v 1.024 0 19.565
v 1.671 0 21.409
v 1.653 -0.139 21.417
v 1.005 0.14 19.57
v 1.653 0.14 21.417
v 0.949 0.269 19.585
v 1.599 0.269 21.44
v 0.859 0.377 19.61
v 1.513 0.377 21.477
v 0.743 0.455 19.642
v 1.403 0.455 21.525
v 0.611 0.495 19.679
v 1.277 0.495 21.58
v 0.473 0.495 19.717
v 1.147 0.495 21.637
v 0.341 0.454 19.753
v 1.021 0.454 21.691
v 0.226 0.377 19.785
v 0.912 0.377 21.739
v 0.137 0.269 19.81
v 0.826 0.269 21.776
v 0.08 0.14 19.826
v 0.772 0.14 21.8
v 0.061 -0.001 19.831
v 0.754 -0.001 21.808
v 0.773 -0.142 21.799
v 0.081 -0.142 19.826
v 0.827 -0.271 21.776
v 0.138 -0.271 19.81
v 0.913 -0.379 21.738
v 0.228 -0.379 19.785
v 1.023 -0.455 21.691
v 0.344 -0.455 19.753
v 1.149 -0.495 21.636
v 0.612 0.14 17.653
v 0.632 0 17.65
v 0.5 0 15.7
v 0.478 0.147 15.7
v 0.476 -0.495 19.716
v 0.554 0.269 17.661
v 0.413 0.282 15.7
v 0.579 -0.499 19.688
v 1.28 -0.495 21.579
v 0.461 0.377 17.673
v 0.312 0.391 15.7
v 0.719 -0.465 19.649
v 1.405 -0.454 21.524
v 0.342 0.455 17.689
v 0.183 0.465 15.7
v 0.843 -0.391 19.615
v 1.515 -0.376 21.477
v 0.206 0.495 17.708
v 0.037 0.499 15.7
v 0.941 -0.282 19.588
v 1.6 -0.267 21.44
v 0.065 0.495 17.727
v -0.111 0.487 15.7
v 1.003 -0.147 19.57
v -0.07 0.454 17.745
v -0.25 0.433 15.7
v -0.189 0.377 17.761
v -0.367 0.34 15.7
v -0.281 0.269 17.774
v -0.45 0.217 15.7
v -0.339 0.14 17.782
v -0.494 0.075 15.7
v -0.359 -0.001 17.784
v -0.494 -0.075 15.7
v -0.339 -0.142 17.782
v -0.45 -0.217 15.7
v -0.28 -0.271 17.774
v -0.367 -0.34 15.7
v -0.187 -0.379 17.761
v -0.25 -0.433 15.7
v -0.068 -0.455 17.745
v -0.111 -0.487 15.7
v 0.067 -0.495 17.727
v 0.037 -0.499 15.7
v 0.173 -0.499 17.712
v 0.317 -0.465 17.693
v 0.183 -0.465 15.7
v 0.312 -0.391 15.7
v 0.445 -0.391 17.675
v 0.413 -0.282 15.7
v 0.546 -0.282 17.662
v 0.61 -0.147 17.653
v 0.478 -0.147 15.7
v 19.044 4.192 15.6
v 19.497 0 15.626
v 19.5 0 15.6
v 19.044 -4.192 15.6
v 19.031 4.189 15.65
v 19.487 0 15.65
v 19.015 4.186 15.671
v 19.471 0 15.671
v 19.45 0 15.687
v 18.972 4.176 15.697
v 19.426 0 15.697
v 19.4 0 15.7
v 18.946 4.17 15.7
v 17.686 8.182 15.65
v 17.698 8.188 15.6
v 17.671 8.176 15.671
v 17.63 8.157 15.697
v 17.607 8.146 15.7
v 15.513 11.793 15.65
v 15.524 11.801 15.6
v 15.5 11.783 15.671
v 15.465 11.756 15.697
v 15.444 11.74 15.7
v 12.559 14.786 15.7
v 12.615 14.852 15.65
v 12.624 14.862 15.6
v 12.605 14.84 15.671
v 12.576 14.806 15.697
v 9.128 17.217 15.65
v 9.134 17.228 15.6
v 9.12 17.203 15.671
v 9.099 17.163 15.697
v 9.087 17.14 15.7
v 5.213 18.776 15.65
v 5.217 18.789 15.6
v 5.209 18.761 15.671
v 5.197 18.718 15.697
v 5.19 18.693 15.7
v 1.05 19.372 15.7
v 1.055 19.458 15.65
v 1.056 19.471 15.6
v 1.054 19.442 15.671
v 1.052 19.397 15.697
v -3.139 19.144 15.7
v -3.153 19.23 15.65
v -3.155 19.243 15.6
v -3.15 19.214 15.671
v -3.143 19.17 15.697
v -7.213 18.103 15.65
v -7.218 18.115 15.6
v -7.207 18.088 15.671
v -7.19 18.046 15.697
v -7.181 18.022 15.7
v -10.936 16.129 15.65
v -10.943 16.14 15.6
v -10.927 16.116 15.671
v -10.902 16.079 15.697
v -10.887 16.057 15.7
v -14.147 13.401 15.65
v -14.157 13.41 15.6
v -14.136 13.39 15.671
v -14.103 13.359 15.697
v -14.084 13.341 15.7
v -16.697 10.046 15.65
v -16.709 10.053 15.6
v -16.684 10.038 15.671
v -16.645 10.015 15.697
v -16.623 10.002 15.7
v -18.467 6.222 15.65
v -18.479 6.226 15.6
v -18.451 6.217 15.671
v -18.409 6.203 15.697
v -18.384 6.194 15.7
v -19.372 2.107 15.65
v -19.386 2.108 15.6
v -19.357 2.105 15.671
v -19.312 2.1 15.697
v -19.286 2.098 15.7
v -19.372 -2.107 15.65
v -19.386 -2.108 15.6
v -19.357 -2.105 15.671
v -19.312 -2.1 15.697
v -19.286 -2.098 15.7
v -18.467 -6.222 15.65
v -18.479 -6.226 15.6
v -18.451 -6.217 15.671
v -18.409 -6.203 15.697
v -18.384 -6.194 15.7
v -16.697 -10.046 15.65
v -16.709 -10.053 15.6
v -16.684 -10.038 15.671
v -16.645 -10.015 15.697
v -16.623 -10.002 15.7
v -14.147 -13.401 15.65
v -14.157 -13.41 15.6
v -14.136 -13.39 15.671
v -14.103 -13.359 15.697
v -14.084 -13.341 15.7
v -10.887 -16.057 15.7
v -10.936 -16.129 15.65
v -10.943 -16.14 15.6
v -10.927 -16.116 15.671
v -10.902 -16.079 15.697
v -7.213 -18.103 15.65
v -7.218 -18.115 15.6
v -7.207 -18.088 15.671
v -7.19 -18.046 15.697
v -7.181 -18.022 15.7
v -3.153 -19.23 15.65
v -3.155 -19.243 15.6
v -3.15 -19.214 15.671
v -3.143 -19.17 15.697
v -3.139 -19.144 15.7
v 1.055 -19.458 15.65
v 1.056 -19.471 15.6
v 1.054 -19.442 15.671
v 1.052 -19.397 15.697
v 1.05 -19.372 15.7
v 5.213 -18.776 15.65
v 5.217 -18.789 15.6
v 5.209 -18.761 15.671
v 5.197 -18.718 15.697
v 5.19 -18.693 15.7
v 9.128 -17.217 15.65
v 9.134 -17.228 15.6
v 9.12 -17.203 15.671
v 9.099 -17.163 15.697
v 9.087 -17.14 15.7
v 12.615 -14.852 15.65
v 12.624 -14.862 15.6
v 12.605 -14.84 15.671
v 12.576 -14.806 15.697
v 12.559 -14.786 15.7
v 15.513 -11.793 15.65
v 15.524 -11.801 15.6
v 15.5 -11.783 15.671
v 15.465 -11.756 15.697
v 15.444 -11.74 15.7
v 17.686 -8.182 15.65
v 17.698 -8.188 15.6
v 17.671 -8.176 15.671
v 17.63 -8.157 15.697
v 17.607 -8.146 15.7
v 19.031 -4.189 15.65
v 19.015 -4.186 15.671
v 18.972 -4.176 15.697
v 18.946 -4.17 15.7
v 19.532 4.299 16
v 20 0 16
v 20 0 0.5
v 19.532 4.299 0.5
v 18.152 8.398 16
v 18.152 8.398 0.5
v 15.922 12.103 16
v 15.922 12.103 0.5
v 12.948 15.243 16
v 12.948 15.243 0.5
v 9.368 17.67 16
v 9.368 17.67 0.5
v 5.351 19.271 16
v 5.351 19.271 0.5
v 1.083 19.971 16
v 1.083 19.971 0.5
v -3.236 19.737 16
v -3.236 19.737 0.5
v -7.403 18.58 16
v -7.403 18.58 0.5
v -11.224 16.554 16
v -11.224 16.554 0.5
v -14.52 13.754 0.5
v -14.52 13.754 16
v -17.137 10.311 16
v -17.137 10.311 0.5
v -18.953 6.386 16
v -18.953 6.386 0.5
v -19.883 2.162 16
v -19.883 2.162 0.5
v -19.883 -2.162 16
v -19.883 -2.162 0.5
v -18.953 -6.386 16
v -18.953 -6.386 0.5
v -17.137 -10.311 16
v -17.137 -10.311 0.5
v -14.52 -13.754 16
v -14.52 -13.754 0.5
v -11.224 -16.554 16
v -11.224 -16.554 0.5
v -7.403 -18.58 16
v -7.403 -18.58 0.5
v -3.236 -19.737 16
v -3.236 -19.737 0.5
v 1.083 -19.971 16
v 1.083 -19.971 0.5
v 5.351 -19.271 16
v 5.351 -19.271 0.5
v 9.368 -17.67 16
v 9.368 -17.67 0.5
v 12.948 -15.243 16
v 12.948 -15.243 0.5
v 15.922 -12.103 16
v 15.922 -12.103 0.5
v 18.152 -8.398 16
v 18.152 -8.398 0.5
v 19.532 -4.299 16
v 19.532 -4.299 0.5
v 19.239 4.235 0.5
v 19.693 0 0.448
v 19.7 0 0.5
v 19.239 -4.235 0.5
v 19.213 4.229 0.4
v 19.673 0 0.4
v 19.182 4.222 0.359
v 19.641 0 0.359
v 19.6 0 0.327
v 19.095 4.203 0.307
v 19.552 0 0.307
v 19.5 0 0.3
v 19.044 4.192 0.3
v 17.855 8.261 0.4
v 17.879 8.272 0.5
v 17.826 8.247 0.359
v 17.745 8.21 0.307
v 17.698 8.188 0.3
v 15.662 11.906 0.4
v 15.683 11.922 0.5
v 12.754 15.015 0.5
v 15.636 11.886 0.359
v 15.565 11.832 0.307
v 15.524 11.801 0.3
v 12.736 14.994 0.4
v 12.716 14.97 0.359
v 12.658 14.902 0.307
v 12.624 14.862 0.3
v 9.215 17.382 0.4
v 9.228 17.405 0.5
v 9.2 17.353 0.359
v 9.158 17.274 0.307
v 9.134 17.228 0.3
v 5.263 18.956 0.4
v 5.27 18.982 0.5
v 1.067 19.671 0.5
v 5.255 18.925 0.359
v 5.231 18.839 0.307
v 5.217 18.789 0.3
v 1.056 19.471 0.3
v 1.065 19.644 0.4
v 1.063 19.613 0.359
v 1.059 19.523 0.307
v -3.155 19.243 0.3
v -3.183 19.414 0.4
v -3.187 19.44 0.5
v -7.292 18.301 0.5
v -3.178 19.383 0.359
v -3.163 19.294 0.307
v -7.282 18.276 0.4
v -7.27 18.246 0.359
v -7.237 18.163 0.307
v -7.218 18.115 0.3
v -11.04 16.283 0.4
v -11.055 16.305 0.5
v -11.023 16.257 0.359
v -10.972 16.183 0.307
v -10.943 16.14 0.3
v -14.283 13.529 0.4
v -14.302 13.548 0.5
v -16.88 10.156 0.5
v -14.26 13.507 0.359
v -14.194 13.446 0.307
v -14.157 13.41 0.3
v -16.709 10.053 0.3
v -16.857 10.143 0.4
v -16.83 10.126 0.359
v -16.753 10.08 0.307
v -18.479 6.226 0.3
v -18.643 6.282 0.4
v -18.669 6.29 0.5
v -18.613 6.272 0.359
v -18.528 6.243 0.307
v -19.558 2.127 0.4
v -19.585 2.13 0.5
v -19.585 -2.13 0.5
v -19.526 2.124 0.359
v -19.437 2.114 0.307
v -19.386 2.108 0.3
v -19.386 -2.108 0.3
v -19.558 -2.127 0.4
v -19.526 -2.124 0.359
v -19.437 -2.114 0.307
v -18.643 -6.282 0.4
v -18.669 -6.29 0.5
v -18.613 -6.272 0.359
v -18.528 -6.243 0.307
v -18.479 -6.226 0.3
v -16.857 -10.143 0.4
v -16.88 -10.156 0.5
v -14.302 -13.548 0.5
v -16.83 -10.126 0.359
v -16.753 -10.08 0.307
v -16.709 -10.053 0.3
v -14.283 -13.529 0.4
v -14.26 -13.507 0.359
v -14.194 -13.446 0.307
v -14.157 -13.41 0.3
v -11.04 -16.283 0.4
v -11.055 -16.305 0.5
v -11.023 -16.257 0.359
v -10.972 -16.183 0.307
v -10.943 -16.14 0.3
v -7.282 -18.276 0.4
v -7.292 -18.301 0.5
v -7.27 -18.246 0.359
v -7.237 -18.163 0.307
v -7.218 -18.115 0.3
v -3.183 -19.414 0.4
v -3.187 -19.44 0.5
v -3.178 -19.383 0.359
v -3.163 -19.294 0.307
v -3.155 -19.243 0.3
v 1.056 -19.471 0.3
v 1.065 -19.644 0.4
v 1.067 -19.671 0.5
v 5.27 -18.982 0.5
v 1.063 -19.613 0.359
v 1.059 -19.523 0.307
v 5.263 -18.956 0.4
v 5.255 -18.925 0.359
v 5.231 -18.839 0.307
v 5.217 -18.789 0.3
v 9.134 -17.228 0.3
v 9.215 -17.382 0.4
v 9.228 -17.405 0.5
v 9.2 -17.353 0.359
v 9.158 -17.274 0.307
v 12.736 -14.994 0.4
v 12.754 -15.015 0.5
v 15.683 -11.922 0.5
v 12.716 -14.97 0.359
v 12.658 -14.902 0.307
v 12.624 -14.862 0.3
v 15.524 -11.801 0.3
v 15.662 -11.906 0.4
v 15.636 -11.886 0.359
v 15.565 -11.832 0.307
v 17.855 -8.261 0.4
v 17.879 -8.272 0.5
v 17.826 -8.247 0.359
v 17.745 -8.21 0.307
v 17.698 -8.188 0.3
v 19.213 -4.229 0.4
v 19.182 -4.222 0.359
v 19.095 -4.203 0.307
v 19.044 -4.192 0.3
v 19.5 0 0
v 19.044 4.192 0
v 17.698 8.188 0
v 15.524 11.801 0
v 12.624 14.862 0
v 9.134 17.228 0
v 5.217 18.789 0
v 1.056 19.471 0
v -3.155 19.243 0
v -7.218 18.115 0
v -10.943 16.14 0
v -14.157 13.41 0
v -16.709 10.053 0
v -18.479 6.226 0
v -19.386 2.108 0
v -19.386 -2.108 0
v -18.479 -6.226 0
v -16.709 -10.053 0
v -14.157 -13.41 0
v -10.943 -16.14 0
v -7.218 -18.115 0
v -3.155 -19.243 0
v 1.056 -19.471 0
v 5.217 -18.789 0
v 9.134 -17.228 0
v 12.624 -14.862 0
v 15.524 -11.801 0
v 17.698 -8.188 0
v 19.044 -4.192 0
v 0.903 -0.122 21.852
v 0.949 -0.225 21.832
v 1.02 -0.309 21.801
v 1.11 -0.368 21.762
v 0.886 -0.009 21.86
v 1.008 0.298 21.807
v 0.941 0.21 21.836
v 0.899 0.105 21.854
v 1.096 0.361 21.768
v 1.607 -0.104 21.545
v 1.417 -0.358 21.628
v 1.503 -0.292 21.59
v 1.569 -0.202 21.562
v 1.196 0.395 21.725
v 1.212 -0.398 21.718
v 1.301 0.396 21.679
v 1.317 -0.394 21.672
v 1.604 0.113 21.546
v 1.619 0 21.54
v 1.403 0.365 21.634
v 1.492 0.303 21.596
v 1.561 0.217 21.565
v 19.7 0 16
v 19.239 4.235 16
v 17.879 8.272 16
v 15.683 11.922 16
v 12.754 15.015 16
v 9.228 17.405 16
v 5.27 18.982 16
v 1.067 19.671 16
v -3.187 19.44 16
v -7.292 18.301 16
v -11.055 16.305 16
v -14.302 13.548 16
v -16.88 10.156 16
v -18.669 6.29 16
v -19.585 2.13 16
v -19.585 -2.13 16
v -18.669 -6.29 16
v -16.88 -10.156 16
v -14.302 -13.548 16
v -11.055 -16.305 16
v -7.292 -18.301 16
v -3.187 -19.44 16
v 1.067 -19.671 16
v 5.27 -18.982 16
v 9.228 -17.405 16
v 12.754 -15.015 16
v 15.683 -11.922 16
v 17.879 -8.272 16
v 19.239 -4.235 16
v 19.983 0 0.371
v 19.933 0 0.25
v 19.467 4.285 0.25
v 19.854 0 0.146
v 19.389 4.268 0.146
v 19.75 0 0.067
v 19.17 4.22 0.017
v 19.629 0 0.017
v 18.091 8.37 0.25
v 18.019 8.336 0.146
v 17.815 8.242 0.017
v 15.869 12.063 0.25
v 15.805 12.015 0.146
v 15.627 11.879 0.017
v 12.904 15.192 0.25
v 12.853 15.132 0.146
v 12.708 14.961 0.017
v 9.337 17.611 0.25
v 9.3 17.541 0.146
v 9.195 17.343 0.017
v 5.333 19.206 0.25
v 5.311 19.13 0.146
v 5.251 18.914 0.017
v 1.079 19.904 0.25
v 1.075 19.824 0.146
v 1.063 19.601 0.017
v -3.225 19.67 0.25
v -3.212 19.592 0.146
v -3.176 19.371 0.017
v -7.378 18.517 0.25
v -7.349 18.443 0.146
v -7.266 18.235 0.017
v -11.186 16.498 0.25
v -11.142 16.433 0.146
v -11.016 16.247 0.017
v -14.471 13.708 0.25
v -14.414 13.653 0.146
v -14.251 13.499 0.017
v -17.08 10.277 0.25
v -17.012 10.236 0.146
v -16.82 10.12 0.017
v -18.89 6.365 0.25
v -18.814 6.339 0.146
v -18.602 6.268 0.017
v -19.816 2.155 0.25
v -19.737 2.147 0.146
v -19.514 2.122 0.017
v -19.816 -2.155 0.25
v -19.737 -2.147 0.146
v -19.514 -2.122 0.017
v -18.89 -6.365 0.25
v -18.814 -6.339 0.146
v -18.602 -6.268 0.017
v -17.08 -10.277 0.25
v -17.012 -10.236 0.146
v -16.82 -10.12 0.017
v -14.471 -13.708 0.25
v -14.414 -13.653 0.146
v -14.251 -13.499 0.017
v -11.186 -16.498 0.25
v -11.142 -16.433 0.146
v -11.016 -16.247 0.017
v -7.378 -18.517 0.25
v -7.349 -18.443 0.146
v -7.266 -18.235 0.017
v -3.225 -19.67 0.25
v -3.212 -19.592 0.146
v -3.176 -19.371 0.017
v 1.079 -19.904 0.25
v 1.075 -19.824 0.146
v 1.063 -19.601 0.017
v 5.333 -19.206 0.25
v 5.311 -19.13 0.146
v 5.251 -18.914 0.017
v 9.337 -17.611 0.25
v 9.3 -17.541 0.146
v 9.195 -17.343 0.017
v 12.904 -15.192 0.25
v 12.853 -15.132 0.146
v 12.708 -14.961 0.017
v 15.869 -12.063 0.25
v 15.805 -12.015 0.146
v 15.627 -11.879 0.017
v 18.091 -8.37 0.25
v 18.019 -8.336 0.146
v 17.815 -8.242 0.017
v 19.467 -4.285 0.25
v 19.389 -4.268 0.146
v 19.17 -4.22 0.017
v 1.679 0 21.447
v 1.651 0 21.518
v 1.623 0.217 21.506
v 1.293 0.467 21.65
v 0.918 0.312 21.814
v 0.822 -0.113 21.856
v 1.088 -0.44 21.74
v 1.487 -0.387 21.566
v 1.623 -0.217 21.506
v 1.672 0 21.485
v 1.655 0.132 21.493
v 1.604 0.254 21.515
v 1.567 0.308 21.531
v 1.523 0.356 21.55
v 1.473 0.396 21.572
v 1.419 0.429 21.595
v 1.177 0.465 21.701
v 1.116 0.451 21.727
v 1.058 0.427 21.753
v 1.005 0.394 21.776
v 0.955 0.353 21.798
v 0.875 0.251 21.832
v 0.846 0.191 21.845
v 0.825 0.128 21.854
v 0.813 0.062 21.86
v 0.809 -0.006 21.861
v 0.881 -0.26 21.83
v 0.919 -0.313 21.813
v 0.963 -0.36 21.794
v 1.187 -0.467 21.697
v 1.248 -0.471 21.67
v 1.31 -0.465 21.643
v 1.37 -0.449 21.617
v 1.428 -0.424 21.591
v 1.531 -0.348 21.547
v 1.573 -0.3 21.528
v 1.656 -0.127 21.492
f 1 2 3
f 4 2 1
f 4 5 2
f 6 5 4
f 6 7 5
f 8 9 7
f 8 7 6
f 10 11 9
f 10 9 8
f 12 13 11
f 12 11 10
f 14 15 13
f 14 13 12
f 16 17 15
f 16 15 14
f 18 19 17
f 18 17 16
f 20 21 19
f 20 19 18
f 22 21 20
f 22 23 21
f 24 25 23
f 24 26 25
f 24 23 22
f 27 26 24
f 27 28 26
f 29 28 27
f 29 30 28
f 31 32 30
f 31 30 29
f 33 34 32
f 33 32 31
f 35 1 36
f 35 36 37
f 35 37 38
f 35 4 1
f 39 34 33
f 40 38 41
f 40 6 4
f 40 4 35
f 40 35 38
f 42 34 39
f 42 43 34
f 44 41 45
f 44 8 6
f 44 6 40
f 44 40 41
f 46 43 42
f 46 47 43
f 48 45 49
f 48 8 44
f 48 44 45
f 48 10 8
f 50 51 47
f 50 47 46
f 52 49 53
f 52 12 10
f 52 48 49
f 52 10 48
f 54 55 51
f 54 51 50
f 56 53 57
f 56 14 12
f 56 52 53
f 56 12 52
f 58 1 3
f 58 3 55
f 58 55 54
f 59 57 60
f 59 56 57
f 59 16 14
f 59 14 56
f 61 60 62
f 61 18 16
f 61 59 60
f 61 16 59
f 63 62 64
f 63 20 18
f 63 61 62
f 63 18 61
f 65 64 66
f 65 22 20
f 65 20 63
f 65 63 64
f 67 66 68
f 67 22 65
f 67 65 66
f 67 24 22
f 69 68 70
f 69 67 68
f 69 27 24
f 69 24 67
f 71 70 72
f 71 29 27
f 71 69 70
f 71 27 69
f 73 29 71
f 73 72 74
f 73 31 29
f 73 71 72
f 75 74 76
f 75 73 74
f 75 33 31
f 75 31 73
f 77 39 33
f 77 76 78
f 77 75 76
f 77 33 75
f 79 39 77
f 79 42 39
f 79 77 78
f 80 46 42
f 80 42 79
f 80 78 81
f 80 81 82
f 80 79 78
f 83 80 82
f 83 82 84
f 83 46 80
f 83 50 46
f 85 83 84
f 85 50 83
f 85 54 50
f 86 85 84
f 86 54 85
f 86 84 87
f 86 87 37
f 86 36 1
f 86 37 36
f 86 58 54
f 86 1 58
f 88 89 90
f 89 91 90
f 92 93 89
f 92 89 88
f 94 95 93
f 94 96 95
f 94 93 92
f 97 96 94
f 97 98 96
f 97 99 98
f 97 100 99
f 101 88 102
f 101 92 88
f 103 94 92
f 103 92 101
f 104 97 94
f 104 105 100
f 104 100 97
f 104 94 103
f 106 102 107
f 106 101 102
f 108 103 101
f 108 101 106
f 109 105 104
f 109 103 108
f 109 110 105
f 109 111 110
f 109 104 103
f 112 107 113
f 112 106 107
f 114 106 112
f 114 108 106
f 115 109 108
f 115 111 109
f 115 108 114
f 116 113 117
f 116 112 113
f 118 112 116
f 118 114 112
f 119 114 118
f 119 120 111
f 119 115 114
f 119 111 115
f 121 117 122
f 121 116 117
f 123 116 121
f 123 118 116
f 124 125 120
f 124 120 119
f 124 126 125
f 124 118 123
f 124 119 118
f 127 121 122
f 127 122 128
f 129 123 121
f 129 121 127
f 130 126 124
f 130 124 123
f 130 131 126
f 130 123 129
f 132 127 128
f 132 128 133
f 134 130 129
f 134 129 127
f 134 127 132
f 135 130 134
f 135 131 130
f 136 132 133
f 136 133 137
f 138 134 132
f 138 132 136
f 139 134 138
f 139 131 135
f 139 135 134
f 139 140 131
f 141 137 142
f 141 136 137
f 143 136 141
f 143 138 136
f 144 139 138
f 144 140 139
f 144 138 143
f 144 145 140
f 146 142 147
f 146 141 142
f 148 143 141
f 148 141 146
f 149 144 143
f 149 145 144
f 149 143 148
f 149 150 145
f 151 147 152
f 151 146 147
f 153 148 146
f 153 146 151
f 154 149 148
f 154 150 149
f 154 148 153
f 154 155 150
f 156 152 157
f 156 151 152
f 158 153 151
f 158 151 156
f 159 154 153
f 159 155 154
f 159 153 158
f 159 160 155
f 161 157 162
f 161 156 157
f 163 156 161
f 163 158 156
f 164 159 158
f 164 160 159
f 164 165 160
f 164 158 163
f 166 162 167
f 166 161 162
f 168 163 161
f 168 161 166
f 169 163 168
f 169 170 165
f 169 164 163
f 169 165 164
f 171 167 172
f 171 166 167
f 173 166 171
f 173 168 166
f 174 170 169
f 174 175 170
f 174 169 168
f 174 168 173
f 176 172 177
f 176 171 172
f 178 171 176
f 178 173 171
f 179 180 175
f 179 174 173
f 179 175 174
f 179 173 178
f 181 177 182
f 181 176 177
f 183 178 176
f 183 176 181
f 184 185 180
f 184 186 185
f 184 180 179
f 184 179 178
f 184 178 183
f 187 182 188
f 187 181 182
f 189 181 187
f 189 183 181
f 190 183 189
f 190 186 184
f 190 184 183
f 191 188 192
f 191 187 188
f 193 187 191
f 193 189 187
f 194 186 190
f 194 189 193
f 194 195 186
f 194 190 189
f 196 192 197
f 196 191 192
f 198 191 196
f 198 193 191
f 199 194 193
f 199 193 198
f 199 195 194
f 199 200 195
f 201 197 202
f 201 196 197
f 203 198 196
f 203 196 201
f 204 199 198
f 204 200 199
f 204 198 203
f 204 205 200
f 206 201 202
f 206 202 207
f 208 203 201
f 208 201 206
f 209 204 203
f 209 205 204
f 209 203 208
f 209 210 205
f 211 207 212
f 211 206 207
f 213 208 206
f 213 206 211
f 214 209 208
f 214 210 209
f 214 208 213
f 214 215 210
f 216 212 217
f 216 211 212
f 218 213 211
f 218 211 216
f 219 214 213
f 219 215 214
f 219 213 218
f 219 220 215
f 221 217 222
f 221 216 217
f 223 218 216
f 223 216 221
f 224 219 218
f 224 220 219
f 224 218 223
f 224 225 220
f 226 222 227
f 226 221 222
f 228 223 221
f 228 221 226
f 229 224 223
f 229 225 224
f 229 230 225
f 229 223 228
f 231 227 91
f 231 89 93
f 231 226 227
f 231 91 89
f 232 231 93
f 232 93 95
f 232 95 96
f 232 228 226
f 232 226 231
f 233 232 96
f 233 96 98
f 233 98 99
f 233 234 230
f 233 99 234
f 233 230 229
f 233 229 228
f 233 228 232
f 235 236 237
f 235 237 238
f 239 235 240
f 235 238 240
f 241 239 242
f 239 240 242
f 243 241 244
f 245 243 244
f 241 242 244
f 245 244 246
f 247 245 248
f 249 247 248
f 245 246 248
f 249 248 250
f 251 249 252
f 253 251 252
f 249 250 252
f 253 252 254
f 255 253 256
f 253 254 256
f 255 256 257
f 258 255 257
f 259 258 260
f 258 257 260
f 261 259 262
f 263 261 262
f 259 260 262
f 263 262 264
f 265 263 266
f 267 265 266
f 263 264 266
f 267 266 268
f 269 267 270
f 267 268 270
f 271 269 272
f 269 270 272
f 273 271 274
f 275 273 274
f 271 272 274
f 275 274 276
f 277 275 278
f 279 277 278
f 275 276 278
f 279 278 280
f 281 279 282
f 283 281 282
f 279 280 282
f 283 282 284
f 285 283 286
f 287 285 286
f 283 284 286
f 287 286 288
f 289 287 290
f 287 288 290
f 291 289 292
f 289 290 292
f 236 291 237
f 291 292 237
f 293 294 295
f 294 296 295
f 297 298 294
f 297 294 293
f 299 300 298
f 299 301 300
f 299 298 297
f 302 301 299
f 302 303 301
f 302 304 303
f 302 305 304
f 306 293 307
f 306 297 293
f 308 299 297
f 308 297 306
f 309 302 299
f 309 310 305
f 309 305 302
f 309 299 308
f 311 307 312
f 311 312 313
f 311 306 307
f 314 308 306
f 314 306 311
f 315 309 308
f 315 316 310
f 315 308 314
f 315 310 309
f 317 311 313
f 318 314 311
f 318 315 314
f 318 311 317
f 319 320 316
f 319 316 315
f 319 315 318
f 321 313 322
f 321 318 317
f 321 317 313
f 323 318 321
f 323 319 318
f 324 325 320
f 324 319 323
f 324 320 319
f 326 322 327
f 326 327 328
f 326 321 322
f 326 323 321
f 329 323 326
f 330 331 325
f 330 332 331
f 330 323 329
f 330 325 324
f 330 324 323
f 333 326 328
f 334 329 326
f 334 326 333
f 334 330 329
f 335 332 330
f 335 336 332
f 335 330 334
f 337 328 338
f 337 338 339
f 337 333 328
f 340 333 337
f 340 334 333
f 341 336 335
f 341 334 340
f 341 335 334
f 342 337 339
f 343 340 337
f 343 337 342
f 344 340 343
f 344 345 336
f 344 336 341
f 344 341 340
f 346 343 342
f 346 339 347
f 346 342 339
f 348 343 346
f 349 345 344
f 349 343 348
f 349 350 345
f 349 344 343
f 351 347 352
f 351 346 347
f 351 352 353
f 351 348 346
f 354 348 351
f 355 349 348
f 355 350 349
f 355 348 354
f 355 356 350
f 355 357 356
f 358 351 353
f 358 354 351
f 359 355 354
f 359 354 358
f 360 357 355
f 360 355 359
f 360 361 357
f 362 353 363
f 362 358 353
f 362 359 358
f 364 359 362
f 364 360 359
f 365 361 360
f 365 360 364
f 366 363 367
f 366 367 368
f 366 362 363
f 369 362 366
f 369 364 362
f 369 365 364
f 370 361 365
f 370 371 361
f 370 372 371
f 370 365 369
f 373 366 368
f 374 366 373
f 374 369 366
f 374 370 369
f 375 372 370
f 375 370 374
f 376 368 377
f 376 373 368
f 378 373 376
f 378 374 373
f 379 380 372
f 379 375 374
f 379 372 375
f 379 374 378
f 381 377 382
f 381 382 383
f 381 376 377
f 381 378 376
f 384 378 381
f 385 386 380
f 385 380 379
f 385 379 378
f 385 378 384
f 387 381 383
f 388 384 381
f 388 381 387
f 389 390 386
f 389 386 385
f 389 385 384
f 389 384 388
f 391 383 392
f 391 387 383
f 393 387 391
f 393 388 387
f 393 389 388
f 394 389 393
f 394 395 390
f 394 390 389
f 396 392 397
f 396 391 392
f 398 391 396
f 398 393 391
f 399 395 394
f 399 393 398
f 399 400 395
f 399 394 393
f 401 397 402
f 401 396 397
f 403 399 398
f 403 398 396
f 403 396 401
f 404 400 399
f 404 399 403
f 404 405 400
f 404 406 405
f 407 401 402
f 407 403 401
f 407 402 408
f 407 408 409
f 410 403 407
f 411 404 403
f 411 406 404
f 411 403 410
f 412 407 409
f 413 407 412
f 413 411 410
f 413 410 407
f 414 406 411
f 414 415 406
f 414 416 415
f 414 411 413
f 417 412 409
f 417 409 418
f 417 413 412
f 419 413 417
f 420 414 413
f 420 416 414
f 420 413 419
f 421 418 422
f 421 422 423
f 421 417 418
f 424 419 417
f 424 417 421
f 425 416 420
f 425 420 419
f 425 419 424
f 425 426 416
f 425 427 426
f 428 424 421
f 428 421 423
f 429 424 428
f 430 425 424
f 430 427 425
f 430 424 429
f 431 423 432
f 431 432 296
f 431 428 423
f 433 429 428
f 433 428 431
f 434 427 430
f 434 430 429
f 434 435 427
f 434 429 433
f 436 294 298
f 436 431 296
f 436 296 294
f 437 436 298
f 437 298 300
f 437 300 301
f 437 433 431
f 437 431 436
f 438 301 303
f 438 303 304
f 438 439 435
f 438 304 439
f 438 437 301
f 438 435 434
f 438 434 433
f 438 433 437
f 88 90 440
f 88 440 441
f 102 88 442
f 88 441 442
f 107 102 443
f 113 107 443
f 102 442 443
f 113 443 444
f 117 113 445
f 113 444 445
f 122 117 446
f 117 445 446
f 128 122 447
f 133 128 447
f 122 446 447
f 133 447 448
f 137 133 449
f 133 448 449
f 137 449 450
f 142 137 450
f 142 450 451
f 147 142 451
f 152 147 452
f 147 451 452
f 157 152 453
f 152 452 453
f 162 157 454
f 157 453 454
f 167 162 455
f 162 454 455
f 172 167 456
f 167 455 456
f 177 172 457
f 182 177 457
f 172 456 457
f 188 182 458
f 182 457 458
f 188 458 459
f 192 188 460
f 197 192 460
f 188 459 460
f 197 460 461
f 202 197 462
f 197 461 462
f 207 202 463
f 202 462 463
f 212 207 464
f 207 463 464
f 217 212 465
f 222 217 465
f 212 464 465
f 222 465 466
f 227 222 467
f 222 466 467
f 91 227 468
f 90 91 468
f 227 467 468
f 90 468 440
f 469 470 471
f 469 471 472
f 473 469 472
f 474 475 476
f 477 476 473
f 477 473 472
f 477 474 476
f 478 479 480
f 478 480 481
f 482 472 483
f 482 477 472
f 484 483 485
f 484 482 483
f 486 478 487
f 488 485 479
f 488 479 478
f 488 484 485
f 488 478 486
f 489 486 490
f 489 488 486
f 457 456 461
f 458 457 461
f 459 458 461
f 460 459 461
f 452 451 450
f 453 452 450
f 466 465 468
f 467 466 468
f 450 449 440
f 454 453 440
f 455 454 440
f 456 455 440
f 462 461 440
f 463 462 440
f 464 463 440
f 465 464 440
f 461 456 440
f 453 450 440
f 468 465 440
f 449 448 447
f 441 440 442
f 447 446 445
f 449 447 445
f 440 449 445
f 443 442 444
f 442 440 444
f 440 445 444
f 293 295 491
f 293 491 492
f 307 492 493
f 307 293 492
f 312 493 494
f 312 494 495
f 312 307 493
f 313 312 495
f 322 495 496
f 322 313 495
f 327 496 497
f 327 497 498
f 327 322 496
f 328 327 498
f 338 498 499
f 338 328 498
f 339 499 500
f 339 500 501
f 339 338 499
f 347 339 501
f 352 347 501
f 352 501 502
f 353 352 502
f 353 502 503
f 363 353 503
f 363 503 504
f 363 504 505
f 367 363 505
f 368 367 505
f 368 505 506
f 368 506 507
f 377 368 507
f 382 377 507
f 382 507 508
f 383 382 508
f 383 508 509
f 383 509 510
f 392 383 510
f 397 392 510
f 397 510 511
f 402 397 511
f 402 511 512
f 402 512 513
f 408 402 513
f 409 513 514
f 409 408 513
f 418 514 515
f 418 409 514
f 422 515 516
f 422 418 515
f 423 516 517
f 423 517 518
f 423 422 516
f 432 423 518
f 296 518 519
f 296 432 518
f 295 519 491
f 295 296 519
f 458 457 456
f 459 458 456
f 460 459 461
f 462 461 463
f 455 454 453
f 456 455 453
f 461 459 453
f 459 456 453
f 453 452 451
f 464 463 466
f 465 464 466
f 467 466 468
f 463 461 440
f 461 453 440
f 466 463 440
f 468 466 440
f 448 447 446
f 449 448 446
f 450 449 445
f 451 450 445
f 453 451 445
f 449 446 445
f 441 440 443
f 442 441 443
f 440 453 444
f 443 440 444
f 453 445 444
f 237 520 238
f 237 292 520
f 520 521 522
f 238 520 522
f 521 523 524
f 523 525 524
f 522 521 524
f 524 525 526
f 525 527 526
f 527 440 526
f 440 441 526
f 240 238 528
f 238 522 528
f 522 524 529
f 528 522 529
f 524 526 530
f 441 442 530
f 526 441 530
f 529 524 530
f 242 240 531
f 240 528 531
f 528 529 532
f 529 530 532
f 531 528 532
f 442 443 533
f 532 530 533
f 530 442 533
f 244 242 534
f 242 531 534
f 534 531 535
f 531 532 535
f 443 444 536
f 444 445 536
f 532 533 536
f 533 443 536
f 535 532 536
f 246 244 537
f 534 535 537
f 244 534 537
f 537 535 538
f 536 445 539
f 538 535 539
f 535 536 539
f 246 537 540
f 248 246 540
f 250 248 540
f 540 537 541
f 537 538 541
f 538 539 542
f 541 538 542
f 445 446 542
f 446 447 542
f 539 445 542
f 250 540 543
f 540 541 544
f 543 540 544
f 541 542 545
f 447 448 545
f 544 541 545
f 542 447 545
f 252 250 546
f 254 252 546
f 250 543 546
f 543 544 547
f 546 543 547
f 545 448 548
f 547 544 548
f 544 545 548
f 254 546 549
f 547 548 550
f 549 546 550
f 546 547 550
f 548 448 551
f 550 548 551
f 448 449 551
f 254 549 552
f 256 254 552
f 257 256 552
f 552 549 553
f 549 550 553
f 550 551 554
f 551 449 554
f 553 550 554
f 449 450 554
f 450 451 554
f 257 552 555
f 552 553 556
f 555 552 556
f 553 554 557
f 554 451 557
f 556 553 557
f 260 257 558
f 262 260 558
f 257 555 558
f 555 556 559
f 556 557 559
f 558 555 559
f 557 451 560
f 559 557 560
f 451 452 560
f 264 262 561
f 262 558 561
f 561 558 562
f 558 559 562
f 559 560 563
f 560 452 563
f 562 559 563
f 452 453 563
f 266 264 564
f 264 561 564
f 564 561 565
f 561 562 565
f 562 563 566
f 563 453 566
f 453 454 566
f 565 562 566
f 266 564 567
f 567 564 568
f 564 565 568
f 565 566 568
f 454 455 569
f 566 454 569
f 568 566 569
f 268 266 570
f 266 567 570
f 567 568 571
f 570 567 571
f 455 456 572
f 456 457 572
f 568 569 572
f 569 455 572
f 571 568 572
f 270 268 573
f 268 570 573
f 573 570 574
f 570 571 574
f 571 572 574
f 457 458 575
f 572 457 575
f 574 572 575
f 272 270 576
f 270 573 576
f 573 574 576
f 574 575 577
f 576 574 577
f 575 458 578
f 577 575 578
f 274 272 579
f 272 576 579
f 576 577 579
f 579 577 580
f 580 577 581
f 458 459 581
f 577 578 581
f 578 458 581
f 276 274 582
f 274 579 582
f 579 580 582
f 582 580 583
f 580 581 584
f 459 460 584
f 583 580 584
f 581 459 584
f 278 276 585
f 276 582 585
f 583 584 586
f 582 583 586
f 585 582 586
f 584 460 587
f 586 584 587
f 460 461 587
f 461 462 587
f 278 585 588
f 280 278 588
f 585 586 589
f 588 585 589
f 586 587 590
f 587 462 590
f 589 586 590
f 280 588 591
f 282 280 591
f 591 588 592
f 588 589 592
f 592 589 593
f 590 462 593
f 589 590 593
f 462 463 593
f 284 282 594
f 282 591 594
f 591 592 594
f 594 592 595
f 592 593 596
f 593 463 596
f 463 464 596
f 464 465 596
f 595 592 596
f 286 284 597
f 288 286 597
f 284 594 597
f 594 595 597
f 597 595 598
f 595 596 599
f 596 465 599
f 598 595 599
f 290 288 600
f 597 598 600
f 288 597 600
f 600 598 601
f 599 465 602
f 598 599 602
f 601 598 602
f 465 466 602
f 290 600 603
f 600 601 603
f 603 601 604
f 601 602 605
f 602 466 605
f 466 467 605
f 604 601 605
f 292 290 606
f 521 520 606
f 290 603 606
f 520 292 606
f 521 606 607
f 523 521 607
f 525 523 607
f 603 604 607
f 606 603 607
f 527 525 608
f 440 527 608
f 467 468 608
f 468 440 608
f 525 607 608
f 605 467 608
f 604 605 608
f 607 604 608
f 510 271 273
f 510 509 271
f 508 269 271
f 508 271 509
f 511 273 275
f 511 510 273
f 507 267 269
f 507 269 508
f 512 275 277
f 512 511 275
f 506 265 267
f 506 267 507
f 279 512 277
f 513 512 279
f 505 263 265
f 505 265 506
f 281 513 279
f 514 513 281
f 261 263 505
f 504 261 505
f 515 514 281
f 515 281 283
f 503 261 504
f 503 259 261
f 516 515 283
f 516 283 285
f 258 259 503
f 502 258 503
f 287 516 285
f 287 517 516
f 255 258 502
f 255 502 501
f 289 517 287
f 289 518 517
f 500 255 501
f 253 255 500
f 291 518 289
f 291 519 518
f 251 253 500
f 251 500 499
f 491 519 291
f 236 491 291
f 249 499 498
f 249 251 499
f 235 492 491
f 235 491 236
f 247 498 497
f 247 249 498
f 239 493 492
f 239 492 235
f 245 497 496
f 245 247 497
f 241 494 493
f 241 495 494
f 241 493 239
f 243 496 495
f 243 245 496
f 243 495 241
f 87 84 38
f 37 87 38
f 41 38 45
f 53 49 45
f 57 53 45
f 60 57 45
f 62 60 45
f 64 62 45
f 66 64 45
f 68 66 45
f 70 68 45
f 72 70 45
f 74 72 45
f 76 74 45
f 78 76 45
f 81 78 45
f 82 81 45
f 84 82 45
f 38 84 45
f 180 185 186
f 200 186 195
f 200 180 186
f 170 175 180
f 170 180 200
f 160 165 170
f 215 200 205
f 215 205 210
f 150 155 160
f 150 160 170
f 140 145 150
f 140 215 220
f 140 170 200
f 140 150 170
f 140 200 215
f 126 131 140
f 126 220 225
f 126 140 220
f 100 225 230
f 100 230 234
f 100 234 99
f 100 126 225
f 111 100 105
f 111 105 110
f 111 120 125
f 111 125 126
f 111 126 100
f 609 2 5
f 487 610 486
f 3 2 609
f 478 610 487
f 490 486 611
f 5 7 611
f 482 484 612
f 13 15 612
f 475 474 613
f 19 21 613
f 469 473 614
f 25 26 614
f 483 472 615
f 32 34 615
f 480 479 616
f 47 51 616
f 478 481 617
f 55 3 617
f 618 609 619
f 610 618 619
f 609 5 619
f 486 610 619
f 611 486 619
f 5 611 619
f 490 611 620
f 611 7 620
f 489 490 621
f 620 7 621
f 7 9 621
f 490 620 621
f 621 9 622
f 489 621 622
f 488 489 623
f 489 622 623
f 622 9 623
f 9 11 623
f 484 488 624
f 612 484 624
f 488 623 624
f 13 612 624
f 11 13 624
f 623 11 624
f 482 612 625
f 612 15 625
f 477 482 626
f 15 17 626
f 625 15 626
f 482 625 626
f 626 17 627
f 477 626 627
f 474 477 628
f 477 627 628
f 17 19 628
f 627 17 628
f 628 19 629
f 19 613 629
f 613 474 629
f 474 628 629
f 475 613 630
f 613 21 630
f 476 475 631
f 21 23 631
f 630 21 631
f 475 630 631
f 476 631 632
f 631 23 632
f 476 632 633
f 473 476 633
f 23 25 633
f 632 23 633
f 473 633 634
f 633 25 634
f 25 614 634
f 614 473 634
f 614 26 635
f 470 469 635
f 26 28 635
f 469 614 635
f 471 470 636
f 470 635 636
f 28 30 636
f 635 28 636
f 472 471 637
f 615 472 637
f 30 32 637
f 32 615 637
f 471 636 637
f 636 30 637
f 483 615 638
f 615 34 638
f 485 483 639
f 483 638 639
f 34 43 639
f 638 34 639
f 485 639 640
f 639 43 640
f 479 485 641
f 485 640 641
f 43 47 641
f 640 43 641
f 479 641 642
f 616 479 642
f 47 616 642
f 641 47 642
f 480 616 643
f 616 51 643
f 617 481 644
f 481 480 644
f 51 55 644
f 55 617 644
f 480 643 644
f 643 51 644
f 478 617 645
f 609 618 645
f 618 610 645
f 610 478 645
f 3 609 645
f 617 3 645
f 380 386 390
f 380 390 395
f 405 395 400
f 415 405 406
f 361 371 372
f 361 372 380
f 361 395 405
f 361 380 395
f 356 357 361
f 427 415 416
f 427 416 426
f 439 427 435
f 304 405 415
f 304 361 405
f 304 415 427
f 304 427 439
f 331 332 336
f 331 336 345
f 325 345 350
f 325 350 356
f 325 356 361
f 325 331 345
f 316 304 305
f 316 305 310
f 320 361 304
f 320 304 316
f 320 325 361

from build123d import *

# Parameters (mm, degrees)
F0_R     = 20
F1_DEPTH = 16
F2_R     = 0.5
F3_T     = -0.3
F4_R     = 19.5
F5_DEPTH = 15.7
F7_R     = 0.5
F9_R     = 0.1
F10_R    = 0.1


with BuildPart() as f1:
    # F0 (on Top) → F1 (new body)
    with BuildSketch(Plane.XY):
        Circle(F0_R)
    extrude(amount=F1_DEPTH)

    # F2
    f2_edges = [f1.edges().sort_by_distance(p)[0] for p in [
        (-20, 0, 0),
    ]]
    fillet(f2_edges, radius=F2_R)

    # F3
    f3_openings = [f1.faces().sort_by_distance(p)[0] for p in [
        (0, 0, 16),
    ]]
    offset(amount=F3_T, openings=f3_openings)


with BuildPart() as f5:
    # F4 (on Top) → F5 (new body)
    with BuildSketch(Plane.XY):
        Circle(F4_R)
    extrude(amount=F5_DEPTH)

    # F10
    f10_edges = [f5.edges().sort_by_distance(p)[0] for p in [
        (-19.5, 0, 15.7),
    ]]
    fillet(f10_edges, radius=F10_R)


with BuildPart() as f8:
    # F8: sweep along a path in F6
    with BuildLine(Plane.XZ) as f8_path:
        ThreePointArc((1.2522729151, 21.7), (0.316405306, 18.7646446553), (0, 15.7))
    # F7 (on face) → F8 (sweep)
    with BuildSketch(Plane.XY.offset(15.7)):
        Circle(F7_R)
    sweep(path=f8_path.line)

    # F9
    f9_edges = [f8.edges().sort_by_distance(p)[0] for p in [
        (0.794015, 0, 21.9),
    ]]
    fillet(f9_edges, radius=F9_R)


solid = Compound([f1.part, f5.part, f8.part])
